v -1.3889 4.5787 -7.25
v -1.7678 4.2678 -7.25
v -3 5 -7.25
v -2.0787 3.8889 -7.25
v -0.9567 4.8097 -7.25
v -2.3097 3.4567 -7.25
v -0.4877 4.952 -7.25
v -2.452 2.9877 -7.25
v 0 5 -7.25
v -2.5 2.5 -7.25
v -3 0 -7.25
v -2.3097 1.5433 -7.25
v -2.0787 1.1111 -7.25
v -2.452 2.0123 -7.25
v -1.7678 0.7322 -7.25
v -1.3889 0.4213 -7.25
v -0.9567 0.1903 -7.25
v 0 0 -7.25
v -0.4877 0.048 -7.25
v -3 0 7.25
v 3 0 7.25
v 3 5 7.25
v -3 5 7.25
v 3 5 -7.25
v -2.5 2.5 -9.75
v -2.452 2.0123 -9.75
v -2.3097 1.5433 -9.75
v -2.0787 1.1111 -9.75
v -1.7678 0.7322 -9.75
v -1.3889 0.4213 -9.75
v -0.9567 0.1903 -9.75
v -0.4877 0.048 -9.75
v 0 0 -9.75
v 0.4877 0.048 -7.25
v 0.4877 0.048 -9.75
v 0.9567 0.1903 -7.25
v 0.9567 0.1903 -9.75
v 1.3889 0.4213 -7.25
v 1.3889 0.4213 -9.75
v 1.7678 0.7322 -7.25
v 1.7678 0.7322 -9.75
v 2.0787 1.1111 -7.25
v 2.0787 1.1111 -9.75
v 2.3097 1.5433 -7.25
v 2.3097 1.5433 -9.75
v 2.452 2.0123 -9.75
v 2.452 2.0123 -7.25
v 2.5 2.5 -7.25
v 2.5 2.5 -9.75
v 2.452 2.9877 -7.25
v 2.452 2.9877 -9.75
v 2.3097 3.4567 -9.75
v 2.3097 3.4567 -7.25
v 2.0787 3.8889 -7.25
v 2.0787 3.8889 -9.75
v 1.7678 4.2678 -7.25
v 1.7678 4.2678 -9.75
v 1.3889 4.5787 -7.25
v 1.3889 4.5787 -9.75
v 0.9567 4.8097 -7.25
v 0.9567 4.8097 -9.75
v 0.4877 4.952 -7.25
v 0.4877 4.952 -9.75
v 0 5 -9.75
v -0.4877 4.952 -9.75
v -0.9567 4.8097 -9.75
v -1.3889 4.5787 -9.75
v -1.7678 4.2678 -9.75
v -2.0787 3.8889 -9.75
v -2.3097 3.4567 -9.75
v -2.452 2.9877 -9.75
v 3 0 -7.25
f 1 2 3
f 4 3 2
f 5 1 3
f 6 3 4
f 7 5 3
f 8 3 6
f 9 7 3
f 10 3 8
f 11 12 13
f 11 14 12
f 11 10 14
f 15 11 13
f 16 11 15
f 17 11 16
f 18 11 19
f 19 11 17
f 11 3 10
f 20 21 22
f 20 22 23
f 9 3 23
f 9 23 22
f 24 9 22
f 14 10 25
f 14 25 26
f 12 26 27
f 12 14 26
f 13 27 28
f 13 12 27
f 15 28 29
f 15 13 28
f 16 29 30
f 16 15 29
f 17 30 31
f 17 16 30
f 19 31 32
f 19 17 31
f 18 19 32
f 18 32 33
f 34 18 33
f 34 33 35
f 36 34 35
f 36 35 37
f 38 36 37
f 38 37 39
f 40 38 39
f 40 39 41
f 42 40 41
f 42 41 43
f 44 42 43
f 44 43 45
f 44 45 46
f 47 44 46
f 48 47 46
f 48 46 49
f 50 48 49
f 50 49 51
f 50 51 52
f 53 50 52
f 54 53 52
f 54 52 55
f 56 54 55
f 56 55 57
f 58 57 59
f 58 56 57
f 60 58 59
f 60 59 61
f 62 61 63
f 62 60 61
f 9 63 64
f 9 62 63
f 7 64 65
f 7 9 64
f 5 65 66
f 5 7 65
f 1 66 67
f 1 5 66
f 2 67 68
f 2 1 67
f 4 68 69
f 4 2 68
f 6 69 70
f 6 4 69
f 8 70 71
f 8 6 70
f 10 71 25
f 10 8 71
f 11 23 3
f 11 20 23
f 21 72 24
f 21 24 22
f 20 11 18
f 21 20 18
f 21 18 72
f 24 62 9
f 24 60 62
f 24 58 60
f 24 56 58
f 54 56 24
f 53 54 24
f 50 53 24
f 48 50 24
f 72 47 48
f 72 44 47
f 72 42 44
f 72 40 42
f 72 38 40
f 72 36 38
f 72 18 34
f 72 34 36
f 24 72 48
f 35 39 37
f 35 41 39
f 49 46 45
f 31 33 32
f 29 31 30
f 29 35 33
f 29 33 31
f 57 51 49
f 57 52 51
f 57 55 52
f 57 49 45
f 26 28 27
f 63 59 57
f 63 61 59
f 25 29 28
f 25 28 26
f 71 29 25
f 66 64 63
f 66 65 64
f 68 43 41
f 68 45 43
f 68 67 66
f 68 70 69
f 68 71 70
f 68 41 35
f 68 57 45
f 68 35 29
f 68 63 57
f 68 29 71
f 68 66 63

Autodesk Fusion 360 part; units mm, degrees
sketch "Sketch1" plane through (0, 0, 0) normal (0, 1, 0) x (1, 0, 0)
  line L0 (3, -7.25) -> (-3, -7.25)
  line L1 (-3, -7.25) -> (-3, 7.25)
  line L2 (-3, 7.25) -> (3, 7.25)
  line L3 (3, 7.25) -> (3, -7.25)
  line L4 (3, -7.25) -> (-3, 7.25) construction
  line L5 (-3, -7.25) -> (3, 7.25) construction
  dimension "d1" = 14.5
  dimension "d2" = 6
extrude "Extrude1" add sketch "Sketch1" along normal blind 5
sketch "Sketch2" plane through (0, 0, -7.25) normal (0, 0, -1) x (-1, 0, 0)
  line L0 (-3, 0) -> (3, 0)
  line L1 (3, 0) -> (3, 5)
  line L2 (3, 5) -> (-3, 5)
  line L3 (-3, 5) -> (-3, 0)
  line L4 (-3, 5) -> (3, 0) construction
  circle A0 centre (0, 2.5) radius 2.5
  dimension "d5" = 5
extrude "Extrude2" add sketch "Sketch2" along normal blind 2.5 contours A0
